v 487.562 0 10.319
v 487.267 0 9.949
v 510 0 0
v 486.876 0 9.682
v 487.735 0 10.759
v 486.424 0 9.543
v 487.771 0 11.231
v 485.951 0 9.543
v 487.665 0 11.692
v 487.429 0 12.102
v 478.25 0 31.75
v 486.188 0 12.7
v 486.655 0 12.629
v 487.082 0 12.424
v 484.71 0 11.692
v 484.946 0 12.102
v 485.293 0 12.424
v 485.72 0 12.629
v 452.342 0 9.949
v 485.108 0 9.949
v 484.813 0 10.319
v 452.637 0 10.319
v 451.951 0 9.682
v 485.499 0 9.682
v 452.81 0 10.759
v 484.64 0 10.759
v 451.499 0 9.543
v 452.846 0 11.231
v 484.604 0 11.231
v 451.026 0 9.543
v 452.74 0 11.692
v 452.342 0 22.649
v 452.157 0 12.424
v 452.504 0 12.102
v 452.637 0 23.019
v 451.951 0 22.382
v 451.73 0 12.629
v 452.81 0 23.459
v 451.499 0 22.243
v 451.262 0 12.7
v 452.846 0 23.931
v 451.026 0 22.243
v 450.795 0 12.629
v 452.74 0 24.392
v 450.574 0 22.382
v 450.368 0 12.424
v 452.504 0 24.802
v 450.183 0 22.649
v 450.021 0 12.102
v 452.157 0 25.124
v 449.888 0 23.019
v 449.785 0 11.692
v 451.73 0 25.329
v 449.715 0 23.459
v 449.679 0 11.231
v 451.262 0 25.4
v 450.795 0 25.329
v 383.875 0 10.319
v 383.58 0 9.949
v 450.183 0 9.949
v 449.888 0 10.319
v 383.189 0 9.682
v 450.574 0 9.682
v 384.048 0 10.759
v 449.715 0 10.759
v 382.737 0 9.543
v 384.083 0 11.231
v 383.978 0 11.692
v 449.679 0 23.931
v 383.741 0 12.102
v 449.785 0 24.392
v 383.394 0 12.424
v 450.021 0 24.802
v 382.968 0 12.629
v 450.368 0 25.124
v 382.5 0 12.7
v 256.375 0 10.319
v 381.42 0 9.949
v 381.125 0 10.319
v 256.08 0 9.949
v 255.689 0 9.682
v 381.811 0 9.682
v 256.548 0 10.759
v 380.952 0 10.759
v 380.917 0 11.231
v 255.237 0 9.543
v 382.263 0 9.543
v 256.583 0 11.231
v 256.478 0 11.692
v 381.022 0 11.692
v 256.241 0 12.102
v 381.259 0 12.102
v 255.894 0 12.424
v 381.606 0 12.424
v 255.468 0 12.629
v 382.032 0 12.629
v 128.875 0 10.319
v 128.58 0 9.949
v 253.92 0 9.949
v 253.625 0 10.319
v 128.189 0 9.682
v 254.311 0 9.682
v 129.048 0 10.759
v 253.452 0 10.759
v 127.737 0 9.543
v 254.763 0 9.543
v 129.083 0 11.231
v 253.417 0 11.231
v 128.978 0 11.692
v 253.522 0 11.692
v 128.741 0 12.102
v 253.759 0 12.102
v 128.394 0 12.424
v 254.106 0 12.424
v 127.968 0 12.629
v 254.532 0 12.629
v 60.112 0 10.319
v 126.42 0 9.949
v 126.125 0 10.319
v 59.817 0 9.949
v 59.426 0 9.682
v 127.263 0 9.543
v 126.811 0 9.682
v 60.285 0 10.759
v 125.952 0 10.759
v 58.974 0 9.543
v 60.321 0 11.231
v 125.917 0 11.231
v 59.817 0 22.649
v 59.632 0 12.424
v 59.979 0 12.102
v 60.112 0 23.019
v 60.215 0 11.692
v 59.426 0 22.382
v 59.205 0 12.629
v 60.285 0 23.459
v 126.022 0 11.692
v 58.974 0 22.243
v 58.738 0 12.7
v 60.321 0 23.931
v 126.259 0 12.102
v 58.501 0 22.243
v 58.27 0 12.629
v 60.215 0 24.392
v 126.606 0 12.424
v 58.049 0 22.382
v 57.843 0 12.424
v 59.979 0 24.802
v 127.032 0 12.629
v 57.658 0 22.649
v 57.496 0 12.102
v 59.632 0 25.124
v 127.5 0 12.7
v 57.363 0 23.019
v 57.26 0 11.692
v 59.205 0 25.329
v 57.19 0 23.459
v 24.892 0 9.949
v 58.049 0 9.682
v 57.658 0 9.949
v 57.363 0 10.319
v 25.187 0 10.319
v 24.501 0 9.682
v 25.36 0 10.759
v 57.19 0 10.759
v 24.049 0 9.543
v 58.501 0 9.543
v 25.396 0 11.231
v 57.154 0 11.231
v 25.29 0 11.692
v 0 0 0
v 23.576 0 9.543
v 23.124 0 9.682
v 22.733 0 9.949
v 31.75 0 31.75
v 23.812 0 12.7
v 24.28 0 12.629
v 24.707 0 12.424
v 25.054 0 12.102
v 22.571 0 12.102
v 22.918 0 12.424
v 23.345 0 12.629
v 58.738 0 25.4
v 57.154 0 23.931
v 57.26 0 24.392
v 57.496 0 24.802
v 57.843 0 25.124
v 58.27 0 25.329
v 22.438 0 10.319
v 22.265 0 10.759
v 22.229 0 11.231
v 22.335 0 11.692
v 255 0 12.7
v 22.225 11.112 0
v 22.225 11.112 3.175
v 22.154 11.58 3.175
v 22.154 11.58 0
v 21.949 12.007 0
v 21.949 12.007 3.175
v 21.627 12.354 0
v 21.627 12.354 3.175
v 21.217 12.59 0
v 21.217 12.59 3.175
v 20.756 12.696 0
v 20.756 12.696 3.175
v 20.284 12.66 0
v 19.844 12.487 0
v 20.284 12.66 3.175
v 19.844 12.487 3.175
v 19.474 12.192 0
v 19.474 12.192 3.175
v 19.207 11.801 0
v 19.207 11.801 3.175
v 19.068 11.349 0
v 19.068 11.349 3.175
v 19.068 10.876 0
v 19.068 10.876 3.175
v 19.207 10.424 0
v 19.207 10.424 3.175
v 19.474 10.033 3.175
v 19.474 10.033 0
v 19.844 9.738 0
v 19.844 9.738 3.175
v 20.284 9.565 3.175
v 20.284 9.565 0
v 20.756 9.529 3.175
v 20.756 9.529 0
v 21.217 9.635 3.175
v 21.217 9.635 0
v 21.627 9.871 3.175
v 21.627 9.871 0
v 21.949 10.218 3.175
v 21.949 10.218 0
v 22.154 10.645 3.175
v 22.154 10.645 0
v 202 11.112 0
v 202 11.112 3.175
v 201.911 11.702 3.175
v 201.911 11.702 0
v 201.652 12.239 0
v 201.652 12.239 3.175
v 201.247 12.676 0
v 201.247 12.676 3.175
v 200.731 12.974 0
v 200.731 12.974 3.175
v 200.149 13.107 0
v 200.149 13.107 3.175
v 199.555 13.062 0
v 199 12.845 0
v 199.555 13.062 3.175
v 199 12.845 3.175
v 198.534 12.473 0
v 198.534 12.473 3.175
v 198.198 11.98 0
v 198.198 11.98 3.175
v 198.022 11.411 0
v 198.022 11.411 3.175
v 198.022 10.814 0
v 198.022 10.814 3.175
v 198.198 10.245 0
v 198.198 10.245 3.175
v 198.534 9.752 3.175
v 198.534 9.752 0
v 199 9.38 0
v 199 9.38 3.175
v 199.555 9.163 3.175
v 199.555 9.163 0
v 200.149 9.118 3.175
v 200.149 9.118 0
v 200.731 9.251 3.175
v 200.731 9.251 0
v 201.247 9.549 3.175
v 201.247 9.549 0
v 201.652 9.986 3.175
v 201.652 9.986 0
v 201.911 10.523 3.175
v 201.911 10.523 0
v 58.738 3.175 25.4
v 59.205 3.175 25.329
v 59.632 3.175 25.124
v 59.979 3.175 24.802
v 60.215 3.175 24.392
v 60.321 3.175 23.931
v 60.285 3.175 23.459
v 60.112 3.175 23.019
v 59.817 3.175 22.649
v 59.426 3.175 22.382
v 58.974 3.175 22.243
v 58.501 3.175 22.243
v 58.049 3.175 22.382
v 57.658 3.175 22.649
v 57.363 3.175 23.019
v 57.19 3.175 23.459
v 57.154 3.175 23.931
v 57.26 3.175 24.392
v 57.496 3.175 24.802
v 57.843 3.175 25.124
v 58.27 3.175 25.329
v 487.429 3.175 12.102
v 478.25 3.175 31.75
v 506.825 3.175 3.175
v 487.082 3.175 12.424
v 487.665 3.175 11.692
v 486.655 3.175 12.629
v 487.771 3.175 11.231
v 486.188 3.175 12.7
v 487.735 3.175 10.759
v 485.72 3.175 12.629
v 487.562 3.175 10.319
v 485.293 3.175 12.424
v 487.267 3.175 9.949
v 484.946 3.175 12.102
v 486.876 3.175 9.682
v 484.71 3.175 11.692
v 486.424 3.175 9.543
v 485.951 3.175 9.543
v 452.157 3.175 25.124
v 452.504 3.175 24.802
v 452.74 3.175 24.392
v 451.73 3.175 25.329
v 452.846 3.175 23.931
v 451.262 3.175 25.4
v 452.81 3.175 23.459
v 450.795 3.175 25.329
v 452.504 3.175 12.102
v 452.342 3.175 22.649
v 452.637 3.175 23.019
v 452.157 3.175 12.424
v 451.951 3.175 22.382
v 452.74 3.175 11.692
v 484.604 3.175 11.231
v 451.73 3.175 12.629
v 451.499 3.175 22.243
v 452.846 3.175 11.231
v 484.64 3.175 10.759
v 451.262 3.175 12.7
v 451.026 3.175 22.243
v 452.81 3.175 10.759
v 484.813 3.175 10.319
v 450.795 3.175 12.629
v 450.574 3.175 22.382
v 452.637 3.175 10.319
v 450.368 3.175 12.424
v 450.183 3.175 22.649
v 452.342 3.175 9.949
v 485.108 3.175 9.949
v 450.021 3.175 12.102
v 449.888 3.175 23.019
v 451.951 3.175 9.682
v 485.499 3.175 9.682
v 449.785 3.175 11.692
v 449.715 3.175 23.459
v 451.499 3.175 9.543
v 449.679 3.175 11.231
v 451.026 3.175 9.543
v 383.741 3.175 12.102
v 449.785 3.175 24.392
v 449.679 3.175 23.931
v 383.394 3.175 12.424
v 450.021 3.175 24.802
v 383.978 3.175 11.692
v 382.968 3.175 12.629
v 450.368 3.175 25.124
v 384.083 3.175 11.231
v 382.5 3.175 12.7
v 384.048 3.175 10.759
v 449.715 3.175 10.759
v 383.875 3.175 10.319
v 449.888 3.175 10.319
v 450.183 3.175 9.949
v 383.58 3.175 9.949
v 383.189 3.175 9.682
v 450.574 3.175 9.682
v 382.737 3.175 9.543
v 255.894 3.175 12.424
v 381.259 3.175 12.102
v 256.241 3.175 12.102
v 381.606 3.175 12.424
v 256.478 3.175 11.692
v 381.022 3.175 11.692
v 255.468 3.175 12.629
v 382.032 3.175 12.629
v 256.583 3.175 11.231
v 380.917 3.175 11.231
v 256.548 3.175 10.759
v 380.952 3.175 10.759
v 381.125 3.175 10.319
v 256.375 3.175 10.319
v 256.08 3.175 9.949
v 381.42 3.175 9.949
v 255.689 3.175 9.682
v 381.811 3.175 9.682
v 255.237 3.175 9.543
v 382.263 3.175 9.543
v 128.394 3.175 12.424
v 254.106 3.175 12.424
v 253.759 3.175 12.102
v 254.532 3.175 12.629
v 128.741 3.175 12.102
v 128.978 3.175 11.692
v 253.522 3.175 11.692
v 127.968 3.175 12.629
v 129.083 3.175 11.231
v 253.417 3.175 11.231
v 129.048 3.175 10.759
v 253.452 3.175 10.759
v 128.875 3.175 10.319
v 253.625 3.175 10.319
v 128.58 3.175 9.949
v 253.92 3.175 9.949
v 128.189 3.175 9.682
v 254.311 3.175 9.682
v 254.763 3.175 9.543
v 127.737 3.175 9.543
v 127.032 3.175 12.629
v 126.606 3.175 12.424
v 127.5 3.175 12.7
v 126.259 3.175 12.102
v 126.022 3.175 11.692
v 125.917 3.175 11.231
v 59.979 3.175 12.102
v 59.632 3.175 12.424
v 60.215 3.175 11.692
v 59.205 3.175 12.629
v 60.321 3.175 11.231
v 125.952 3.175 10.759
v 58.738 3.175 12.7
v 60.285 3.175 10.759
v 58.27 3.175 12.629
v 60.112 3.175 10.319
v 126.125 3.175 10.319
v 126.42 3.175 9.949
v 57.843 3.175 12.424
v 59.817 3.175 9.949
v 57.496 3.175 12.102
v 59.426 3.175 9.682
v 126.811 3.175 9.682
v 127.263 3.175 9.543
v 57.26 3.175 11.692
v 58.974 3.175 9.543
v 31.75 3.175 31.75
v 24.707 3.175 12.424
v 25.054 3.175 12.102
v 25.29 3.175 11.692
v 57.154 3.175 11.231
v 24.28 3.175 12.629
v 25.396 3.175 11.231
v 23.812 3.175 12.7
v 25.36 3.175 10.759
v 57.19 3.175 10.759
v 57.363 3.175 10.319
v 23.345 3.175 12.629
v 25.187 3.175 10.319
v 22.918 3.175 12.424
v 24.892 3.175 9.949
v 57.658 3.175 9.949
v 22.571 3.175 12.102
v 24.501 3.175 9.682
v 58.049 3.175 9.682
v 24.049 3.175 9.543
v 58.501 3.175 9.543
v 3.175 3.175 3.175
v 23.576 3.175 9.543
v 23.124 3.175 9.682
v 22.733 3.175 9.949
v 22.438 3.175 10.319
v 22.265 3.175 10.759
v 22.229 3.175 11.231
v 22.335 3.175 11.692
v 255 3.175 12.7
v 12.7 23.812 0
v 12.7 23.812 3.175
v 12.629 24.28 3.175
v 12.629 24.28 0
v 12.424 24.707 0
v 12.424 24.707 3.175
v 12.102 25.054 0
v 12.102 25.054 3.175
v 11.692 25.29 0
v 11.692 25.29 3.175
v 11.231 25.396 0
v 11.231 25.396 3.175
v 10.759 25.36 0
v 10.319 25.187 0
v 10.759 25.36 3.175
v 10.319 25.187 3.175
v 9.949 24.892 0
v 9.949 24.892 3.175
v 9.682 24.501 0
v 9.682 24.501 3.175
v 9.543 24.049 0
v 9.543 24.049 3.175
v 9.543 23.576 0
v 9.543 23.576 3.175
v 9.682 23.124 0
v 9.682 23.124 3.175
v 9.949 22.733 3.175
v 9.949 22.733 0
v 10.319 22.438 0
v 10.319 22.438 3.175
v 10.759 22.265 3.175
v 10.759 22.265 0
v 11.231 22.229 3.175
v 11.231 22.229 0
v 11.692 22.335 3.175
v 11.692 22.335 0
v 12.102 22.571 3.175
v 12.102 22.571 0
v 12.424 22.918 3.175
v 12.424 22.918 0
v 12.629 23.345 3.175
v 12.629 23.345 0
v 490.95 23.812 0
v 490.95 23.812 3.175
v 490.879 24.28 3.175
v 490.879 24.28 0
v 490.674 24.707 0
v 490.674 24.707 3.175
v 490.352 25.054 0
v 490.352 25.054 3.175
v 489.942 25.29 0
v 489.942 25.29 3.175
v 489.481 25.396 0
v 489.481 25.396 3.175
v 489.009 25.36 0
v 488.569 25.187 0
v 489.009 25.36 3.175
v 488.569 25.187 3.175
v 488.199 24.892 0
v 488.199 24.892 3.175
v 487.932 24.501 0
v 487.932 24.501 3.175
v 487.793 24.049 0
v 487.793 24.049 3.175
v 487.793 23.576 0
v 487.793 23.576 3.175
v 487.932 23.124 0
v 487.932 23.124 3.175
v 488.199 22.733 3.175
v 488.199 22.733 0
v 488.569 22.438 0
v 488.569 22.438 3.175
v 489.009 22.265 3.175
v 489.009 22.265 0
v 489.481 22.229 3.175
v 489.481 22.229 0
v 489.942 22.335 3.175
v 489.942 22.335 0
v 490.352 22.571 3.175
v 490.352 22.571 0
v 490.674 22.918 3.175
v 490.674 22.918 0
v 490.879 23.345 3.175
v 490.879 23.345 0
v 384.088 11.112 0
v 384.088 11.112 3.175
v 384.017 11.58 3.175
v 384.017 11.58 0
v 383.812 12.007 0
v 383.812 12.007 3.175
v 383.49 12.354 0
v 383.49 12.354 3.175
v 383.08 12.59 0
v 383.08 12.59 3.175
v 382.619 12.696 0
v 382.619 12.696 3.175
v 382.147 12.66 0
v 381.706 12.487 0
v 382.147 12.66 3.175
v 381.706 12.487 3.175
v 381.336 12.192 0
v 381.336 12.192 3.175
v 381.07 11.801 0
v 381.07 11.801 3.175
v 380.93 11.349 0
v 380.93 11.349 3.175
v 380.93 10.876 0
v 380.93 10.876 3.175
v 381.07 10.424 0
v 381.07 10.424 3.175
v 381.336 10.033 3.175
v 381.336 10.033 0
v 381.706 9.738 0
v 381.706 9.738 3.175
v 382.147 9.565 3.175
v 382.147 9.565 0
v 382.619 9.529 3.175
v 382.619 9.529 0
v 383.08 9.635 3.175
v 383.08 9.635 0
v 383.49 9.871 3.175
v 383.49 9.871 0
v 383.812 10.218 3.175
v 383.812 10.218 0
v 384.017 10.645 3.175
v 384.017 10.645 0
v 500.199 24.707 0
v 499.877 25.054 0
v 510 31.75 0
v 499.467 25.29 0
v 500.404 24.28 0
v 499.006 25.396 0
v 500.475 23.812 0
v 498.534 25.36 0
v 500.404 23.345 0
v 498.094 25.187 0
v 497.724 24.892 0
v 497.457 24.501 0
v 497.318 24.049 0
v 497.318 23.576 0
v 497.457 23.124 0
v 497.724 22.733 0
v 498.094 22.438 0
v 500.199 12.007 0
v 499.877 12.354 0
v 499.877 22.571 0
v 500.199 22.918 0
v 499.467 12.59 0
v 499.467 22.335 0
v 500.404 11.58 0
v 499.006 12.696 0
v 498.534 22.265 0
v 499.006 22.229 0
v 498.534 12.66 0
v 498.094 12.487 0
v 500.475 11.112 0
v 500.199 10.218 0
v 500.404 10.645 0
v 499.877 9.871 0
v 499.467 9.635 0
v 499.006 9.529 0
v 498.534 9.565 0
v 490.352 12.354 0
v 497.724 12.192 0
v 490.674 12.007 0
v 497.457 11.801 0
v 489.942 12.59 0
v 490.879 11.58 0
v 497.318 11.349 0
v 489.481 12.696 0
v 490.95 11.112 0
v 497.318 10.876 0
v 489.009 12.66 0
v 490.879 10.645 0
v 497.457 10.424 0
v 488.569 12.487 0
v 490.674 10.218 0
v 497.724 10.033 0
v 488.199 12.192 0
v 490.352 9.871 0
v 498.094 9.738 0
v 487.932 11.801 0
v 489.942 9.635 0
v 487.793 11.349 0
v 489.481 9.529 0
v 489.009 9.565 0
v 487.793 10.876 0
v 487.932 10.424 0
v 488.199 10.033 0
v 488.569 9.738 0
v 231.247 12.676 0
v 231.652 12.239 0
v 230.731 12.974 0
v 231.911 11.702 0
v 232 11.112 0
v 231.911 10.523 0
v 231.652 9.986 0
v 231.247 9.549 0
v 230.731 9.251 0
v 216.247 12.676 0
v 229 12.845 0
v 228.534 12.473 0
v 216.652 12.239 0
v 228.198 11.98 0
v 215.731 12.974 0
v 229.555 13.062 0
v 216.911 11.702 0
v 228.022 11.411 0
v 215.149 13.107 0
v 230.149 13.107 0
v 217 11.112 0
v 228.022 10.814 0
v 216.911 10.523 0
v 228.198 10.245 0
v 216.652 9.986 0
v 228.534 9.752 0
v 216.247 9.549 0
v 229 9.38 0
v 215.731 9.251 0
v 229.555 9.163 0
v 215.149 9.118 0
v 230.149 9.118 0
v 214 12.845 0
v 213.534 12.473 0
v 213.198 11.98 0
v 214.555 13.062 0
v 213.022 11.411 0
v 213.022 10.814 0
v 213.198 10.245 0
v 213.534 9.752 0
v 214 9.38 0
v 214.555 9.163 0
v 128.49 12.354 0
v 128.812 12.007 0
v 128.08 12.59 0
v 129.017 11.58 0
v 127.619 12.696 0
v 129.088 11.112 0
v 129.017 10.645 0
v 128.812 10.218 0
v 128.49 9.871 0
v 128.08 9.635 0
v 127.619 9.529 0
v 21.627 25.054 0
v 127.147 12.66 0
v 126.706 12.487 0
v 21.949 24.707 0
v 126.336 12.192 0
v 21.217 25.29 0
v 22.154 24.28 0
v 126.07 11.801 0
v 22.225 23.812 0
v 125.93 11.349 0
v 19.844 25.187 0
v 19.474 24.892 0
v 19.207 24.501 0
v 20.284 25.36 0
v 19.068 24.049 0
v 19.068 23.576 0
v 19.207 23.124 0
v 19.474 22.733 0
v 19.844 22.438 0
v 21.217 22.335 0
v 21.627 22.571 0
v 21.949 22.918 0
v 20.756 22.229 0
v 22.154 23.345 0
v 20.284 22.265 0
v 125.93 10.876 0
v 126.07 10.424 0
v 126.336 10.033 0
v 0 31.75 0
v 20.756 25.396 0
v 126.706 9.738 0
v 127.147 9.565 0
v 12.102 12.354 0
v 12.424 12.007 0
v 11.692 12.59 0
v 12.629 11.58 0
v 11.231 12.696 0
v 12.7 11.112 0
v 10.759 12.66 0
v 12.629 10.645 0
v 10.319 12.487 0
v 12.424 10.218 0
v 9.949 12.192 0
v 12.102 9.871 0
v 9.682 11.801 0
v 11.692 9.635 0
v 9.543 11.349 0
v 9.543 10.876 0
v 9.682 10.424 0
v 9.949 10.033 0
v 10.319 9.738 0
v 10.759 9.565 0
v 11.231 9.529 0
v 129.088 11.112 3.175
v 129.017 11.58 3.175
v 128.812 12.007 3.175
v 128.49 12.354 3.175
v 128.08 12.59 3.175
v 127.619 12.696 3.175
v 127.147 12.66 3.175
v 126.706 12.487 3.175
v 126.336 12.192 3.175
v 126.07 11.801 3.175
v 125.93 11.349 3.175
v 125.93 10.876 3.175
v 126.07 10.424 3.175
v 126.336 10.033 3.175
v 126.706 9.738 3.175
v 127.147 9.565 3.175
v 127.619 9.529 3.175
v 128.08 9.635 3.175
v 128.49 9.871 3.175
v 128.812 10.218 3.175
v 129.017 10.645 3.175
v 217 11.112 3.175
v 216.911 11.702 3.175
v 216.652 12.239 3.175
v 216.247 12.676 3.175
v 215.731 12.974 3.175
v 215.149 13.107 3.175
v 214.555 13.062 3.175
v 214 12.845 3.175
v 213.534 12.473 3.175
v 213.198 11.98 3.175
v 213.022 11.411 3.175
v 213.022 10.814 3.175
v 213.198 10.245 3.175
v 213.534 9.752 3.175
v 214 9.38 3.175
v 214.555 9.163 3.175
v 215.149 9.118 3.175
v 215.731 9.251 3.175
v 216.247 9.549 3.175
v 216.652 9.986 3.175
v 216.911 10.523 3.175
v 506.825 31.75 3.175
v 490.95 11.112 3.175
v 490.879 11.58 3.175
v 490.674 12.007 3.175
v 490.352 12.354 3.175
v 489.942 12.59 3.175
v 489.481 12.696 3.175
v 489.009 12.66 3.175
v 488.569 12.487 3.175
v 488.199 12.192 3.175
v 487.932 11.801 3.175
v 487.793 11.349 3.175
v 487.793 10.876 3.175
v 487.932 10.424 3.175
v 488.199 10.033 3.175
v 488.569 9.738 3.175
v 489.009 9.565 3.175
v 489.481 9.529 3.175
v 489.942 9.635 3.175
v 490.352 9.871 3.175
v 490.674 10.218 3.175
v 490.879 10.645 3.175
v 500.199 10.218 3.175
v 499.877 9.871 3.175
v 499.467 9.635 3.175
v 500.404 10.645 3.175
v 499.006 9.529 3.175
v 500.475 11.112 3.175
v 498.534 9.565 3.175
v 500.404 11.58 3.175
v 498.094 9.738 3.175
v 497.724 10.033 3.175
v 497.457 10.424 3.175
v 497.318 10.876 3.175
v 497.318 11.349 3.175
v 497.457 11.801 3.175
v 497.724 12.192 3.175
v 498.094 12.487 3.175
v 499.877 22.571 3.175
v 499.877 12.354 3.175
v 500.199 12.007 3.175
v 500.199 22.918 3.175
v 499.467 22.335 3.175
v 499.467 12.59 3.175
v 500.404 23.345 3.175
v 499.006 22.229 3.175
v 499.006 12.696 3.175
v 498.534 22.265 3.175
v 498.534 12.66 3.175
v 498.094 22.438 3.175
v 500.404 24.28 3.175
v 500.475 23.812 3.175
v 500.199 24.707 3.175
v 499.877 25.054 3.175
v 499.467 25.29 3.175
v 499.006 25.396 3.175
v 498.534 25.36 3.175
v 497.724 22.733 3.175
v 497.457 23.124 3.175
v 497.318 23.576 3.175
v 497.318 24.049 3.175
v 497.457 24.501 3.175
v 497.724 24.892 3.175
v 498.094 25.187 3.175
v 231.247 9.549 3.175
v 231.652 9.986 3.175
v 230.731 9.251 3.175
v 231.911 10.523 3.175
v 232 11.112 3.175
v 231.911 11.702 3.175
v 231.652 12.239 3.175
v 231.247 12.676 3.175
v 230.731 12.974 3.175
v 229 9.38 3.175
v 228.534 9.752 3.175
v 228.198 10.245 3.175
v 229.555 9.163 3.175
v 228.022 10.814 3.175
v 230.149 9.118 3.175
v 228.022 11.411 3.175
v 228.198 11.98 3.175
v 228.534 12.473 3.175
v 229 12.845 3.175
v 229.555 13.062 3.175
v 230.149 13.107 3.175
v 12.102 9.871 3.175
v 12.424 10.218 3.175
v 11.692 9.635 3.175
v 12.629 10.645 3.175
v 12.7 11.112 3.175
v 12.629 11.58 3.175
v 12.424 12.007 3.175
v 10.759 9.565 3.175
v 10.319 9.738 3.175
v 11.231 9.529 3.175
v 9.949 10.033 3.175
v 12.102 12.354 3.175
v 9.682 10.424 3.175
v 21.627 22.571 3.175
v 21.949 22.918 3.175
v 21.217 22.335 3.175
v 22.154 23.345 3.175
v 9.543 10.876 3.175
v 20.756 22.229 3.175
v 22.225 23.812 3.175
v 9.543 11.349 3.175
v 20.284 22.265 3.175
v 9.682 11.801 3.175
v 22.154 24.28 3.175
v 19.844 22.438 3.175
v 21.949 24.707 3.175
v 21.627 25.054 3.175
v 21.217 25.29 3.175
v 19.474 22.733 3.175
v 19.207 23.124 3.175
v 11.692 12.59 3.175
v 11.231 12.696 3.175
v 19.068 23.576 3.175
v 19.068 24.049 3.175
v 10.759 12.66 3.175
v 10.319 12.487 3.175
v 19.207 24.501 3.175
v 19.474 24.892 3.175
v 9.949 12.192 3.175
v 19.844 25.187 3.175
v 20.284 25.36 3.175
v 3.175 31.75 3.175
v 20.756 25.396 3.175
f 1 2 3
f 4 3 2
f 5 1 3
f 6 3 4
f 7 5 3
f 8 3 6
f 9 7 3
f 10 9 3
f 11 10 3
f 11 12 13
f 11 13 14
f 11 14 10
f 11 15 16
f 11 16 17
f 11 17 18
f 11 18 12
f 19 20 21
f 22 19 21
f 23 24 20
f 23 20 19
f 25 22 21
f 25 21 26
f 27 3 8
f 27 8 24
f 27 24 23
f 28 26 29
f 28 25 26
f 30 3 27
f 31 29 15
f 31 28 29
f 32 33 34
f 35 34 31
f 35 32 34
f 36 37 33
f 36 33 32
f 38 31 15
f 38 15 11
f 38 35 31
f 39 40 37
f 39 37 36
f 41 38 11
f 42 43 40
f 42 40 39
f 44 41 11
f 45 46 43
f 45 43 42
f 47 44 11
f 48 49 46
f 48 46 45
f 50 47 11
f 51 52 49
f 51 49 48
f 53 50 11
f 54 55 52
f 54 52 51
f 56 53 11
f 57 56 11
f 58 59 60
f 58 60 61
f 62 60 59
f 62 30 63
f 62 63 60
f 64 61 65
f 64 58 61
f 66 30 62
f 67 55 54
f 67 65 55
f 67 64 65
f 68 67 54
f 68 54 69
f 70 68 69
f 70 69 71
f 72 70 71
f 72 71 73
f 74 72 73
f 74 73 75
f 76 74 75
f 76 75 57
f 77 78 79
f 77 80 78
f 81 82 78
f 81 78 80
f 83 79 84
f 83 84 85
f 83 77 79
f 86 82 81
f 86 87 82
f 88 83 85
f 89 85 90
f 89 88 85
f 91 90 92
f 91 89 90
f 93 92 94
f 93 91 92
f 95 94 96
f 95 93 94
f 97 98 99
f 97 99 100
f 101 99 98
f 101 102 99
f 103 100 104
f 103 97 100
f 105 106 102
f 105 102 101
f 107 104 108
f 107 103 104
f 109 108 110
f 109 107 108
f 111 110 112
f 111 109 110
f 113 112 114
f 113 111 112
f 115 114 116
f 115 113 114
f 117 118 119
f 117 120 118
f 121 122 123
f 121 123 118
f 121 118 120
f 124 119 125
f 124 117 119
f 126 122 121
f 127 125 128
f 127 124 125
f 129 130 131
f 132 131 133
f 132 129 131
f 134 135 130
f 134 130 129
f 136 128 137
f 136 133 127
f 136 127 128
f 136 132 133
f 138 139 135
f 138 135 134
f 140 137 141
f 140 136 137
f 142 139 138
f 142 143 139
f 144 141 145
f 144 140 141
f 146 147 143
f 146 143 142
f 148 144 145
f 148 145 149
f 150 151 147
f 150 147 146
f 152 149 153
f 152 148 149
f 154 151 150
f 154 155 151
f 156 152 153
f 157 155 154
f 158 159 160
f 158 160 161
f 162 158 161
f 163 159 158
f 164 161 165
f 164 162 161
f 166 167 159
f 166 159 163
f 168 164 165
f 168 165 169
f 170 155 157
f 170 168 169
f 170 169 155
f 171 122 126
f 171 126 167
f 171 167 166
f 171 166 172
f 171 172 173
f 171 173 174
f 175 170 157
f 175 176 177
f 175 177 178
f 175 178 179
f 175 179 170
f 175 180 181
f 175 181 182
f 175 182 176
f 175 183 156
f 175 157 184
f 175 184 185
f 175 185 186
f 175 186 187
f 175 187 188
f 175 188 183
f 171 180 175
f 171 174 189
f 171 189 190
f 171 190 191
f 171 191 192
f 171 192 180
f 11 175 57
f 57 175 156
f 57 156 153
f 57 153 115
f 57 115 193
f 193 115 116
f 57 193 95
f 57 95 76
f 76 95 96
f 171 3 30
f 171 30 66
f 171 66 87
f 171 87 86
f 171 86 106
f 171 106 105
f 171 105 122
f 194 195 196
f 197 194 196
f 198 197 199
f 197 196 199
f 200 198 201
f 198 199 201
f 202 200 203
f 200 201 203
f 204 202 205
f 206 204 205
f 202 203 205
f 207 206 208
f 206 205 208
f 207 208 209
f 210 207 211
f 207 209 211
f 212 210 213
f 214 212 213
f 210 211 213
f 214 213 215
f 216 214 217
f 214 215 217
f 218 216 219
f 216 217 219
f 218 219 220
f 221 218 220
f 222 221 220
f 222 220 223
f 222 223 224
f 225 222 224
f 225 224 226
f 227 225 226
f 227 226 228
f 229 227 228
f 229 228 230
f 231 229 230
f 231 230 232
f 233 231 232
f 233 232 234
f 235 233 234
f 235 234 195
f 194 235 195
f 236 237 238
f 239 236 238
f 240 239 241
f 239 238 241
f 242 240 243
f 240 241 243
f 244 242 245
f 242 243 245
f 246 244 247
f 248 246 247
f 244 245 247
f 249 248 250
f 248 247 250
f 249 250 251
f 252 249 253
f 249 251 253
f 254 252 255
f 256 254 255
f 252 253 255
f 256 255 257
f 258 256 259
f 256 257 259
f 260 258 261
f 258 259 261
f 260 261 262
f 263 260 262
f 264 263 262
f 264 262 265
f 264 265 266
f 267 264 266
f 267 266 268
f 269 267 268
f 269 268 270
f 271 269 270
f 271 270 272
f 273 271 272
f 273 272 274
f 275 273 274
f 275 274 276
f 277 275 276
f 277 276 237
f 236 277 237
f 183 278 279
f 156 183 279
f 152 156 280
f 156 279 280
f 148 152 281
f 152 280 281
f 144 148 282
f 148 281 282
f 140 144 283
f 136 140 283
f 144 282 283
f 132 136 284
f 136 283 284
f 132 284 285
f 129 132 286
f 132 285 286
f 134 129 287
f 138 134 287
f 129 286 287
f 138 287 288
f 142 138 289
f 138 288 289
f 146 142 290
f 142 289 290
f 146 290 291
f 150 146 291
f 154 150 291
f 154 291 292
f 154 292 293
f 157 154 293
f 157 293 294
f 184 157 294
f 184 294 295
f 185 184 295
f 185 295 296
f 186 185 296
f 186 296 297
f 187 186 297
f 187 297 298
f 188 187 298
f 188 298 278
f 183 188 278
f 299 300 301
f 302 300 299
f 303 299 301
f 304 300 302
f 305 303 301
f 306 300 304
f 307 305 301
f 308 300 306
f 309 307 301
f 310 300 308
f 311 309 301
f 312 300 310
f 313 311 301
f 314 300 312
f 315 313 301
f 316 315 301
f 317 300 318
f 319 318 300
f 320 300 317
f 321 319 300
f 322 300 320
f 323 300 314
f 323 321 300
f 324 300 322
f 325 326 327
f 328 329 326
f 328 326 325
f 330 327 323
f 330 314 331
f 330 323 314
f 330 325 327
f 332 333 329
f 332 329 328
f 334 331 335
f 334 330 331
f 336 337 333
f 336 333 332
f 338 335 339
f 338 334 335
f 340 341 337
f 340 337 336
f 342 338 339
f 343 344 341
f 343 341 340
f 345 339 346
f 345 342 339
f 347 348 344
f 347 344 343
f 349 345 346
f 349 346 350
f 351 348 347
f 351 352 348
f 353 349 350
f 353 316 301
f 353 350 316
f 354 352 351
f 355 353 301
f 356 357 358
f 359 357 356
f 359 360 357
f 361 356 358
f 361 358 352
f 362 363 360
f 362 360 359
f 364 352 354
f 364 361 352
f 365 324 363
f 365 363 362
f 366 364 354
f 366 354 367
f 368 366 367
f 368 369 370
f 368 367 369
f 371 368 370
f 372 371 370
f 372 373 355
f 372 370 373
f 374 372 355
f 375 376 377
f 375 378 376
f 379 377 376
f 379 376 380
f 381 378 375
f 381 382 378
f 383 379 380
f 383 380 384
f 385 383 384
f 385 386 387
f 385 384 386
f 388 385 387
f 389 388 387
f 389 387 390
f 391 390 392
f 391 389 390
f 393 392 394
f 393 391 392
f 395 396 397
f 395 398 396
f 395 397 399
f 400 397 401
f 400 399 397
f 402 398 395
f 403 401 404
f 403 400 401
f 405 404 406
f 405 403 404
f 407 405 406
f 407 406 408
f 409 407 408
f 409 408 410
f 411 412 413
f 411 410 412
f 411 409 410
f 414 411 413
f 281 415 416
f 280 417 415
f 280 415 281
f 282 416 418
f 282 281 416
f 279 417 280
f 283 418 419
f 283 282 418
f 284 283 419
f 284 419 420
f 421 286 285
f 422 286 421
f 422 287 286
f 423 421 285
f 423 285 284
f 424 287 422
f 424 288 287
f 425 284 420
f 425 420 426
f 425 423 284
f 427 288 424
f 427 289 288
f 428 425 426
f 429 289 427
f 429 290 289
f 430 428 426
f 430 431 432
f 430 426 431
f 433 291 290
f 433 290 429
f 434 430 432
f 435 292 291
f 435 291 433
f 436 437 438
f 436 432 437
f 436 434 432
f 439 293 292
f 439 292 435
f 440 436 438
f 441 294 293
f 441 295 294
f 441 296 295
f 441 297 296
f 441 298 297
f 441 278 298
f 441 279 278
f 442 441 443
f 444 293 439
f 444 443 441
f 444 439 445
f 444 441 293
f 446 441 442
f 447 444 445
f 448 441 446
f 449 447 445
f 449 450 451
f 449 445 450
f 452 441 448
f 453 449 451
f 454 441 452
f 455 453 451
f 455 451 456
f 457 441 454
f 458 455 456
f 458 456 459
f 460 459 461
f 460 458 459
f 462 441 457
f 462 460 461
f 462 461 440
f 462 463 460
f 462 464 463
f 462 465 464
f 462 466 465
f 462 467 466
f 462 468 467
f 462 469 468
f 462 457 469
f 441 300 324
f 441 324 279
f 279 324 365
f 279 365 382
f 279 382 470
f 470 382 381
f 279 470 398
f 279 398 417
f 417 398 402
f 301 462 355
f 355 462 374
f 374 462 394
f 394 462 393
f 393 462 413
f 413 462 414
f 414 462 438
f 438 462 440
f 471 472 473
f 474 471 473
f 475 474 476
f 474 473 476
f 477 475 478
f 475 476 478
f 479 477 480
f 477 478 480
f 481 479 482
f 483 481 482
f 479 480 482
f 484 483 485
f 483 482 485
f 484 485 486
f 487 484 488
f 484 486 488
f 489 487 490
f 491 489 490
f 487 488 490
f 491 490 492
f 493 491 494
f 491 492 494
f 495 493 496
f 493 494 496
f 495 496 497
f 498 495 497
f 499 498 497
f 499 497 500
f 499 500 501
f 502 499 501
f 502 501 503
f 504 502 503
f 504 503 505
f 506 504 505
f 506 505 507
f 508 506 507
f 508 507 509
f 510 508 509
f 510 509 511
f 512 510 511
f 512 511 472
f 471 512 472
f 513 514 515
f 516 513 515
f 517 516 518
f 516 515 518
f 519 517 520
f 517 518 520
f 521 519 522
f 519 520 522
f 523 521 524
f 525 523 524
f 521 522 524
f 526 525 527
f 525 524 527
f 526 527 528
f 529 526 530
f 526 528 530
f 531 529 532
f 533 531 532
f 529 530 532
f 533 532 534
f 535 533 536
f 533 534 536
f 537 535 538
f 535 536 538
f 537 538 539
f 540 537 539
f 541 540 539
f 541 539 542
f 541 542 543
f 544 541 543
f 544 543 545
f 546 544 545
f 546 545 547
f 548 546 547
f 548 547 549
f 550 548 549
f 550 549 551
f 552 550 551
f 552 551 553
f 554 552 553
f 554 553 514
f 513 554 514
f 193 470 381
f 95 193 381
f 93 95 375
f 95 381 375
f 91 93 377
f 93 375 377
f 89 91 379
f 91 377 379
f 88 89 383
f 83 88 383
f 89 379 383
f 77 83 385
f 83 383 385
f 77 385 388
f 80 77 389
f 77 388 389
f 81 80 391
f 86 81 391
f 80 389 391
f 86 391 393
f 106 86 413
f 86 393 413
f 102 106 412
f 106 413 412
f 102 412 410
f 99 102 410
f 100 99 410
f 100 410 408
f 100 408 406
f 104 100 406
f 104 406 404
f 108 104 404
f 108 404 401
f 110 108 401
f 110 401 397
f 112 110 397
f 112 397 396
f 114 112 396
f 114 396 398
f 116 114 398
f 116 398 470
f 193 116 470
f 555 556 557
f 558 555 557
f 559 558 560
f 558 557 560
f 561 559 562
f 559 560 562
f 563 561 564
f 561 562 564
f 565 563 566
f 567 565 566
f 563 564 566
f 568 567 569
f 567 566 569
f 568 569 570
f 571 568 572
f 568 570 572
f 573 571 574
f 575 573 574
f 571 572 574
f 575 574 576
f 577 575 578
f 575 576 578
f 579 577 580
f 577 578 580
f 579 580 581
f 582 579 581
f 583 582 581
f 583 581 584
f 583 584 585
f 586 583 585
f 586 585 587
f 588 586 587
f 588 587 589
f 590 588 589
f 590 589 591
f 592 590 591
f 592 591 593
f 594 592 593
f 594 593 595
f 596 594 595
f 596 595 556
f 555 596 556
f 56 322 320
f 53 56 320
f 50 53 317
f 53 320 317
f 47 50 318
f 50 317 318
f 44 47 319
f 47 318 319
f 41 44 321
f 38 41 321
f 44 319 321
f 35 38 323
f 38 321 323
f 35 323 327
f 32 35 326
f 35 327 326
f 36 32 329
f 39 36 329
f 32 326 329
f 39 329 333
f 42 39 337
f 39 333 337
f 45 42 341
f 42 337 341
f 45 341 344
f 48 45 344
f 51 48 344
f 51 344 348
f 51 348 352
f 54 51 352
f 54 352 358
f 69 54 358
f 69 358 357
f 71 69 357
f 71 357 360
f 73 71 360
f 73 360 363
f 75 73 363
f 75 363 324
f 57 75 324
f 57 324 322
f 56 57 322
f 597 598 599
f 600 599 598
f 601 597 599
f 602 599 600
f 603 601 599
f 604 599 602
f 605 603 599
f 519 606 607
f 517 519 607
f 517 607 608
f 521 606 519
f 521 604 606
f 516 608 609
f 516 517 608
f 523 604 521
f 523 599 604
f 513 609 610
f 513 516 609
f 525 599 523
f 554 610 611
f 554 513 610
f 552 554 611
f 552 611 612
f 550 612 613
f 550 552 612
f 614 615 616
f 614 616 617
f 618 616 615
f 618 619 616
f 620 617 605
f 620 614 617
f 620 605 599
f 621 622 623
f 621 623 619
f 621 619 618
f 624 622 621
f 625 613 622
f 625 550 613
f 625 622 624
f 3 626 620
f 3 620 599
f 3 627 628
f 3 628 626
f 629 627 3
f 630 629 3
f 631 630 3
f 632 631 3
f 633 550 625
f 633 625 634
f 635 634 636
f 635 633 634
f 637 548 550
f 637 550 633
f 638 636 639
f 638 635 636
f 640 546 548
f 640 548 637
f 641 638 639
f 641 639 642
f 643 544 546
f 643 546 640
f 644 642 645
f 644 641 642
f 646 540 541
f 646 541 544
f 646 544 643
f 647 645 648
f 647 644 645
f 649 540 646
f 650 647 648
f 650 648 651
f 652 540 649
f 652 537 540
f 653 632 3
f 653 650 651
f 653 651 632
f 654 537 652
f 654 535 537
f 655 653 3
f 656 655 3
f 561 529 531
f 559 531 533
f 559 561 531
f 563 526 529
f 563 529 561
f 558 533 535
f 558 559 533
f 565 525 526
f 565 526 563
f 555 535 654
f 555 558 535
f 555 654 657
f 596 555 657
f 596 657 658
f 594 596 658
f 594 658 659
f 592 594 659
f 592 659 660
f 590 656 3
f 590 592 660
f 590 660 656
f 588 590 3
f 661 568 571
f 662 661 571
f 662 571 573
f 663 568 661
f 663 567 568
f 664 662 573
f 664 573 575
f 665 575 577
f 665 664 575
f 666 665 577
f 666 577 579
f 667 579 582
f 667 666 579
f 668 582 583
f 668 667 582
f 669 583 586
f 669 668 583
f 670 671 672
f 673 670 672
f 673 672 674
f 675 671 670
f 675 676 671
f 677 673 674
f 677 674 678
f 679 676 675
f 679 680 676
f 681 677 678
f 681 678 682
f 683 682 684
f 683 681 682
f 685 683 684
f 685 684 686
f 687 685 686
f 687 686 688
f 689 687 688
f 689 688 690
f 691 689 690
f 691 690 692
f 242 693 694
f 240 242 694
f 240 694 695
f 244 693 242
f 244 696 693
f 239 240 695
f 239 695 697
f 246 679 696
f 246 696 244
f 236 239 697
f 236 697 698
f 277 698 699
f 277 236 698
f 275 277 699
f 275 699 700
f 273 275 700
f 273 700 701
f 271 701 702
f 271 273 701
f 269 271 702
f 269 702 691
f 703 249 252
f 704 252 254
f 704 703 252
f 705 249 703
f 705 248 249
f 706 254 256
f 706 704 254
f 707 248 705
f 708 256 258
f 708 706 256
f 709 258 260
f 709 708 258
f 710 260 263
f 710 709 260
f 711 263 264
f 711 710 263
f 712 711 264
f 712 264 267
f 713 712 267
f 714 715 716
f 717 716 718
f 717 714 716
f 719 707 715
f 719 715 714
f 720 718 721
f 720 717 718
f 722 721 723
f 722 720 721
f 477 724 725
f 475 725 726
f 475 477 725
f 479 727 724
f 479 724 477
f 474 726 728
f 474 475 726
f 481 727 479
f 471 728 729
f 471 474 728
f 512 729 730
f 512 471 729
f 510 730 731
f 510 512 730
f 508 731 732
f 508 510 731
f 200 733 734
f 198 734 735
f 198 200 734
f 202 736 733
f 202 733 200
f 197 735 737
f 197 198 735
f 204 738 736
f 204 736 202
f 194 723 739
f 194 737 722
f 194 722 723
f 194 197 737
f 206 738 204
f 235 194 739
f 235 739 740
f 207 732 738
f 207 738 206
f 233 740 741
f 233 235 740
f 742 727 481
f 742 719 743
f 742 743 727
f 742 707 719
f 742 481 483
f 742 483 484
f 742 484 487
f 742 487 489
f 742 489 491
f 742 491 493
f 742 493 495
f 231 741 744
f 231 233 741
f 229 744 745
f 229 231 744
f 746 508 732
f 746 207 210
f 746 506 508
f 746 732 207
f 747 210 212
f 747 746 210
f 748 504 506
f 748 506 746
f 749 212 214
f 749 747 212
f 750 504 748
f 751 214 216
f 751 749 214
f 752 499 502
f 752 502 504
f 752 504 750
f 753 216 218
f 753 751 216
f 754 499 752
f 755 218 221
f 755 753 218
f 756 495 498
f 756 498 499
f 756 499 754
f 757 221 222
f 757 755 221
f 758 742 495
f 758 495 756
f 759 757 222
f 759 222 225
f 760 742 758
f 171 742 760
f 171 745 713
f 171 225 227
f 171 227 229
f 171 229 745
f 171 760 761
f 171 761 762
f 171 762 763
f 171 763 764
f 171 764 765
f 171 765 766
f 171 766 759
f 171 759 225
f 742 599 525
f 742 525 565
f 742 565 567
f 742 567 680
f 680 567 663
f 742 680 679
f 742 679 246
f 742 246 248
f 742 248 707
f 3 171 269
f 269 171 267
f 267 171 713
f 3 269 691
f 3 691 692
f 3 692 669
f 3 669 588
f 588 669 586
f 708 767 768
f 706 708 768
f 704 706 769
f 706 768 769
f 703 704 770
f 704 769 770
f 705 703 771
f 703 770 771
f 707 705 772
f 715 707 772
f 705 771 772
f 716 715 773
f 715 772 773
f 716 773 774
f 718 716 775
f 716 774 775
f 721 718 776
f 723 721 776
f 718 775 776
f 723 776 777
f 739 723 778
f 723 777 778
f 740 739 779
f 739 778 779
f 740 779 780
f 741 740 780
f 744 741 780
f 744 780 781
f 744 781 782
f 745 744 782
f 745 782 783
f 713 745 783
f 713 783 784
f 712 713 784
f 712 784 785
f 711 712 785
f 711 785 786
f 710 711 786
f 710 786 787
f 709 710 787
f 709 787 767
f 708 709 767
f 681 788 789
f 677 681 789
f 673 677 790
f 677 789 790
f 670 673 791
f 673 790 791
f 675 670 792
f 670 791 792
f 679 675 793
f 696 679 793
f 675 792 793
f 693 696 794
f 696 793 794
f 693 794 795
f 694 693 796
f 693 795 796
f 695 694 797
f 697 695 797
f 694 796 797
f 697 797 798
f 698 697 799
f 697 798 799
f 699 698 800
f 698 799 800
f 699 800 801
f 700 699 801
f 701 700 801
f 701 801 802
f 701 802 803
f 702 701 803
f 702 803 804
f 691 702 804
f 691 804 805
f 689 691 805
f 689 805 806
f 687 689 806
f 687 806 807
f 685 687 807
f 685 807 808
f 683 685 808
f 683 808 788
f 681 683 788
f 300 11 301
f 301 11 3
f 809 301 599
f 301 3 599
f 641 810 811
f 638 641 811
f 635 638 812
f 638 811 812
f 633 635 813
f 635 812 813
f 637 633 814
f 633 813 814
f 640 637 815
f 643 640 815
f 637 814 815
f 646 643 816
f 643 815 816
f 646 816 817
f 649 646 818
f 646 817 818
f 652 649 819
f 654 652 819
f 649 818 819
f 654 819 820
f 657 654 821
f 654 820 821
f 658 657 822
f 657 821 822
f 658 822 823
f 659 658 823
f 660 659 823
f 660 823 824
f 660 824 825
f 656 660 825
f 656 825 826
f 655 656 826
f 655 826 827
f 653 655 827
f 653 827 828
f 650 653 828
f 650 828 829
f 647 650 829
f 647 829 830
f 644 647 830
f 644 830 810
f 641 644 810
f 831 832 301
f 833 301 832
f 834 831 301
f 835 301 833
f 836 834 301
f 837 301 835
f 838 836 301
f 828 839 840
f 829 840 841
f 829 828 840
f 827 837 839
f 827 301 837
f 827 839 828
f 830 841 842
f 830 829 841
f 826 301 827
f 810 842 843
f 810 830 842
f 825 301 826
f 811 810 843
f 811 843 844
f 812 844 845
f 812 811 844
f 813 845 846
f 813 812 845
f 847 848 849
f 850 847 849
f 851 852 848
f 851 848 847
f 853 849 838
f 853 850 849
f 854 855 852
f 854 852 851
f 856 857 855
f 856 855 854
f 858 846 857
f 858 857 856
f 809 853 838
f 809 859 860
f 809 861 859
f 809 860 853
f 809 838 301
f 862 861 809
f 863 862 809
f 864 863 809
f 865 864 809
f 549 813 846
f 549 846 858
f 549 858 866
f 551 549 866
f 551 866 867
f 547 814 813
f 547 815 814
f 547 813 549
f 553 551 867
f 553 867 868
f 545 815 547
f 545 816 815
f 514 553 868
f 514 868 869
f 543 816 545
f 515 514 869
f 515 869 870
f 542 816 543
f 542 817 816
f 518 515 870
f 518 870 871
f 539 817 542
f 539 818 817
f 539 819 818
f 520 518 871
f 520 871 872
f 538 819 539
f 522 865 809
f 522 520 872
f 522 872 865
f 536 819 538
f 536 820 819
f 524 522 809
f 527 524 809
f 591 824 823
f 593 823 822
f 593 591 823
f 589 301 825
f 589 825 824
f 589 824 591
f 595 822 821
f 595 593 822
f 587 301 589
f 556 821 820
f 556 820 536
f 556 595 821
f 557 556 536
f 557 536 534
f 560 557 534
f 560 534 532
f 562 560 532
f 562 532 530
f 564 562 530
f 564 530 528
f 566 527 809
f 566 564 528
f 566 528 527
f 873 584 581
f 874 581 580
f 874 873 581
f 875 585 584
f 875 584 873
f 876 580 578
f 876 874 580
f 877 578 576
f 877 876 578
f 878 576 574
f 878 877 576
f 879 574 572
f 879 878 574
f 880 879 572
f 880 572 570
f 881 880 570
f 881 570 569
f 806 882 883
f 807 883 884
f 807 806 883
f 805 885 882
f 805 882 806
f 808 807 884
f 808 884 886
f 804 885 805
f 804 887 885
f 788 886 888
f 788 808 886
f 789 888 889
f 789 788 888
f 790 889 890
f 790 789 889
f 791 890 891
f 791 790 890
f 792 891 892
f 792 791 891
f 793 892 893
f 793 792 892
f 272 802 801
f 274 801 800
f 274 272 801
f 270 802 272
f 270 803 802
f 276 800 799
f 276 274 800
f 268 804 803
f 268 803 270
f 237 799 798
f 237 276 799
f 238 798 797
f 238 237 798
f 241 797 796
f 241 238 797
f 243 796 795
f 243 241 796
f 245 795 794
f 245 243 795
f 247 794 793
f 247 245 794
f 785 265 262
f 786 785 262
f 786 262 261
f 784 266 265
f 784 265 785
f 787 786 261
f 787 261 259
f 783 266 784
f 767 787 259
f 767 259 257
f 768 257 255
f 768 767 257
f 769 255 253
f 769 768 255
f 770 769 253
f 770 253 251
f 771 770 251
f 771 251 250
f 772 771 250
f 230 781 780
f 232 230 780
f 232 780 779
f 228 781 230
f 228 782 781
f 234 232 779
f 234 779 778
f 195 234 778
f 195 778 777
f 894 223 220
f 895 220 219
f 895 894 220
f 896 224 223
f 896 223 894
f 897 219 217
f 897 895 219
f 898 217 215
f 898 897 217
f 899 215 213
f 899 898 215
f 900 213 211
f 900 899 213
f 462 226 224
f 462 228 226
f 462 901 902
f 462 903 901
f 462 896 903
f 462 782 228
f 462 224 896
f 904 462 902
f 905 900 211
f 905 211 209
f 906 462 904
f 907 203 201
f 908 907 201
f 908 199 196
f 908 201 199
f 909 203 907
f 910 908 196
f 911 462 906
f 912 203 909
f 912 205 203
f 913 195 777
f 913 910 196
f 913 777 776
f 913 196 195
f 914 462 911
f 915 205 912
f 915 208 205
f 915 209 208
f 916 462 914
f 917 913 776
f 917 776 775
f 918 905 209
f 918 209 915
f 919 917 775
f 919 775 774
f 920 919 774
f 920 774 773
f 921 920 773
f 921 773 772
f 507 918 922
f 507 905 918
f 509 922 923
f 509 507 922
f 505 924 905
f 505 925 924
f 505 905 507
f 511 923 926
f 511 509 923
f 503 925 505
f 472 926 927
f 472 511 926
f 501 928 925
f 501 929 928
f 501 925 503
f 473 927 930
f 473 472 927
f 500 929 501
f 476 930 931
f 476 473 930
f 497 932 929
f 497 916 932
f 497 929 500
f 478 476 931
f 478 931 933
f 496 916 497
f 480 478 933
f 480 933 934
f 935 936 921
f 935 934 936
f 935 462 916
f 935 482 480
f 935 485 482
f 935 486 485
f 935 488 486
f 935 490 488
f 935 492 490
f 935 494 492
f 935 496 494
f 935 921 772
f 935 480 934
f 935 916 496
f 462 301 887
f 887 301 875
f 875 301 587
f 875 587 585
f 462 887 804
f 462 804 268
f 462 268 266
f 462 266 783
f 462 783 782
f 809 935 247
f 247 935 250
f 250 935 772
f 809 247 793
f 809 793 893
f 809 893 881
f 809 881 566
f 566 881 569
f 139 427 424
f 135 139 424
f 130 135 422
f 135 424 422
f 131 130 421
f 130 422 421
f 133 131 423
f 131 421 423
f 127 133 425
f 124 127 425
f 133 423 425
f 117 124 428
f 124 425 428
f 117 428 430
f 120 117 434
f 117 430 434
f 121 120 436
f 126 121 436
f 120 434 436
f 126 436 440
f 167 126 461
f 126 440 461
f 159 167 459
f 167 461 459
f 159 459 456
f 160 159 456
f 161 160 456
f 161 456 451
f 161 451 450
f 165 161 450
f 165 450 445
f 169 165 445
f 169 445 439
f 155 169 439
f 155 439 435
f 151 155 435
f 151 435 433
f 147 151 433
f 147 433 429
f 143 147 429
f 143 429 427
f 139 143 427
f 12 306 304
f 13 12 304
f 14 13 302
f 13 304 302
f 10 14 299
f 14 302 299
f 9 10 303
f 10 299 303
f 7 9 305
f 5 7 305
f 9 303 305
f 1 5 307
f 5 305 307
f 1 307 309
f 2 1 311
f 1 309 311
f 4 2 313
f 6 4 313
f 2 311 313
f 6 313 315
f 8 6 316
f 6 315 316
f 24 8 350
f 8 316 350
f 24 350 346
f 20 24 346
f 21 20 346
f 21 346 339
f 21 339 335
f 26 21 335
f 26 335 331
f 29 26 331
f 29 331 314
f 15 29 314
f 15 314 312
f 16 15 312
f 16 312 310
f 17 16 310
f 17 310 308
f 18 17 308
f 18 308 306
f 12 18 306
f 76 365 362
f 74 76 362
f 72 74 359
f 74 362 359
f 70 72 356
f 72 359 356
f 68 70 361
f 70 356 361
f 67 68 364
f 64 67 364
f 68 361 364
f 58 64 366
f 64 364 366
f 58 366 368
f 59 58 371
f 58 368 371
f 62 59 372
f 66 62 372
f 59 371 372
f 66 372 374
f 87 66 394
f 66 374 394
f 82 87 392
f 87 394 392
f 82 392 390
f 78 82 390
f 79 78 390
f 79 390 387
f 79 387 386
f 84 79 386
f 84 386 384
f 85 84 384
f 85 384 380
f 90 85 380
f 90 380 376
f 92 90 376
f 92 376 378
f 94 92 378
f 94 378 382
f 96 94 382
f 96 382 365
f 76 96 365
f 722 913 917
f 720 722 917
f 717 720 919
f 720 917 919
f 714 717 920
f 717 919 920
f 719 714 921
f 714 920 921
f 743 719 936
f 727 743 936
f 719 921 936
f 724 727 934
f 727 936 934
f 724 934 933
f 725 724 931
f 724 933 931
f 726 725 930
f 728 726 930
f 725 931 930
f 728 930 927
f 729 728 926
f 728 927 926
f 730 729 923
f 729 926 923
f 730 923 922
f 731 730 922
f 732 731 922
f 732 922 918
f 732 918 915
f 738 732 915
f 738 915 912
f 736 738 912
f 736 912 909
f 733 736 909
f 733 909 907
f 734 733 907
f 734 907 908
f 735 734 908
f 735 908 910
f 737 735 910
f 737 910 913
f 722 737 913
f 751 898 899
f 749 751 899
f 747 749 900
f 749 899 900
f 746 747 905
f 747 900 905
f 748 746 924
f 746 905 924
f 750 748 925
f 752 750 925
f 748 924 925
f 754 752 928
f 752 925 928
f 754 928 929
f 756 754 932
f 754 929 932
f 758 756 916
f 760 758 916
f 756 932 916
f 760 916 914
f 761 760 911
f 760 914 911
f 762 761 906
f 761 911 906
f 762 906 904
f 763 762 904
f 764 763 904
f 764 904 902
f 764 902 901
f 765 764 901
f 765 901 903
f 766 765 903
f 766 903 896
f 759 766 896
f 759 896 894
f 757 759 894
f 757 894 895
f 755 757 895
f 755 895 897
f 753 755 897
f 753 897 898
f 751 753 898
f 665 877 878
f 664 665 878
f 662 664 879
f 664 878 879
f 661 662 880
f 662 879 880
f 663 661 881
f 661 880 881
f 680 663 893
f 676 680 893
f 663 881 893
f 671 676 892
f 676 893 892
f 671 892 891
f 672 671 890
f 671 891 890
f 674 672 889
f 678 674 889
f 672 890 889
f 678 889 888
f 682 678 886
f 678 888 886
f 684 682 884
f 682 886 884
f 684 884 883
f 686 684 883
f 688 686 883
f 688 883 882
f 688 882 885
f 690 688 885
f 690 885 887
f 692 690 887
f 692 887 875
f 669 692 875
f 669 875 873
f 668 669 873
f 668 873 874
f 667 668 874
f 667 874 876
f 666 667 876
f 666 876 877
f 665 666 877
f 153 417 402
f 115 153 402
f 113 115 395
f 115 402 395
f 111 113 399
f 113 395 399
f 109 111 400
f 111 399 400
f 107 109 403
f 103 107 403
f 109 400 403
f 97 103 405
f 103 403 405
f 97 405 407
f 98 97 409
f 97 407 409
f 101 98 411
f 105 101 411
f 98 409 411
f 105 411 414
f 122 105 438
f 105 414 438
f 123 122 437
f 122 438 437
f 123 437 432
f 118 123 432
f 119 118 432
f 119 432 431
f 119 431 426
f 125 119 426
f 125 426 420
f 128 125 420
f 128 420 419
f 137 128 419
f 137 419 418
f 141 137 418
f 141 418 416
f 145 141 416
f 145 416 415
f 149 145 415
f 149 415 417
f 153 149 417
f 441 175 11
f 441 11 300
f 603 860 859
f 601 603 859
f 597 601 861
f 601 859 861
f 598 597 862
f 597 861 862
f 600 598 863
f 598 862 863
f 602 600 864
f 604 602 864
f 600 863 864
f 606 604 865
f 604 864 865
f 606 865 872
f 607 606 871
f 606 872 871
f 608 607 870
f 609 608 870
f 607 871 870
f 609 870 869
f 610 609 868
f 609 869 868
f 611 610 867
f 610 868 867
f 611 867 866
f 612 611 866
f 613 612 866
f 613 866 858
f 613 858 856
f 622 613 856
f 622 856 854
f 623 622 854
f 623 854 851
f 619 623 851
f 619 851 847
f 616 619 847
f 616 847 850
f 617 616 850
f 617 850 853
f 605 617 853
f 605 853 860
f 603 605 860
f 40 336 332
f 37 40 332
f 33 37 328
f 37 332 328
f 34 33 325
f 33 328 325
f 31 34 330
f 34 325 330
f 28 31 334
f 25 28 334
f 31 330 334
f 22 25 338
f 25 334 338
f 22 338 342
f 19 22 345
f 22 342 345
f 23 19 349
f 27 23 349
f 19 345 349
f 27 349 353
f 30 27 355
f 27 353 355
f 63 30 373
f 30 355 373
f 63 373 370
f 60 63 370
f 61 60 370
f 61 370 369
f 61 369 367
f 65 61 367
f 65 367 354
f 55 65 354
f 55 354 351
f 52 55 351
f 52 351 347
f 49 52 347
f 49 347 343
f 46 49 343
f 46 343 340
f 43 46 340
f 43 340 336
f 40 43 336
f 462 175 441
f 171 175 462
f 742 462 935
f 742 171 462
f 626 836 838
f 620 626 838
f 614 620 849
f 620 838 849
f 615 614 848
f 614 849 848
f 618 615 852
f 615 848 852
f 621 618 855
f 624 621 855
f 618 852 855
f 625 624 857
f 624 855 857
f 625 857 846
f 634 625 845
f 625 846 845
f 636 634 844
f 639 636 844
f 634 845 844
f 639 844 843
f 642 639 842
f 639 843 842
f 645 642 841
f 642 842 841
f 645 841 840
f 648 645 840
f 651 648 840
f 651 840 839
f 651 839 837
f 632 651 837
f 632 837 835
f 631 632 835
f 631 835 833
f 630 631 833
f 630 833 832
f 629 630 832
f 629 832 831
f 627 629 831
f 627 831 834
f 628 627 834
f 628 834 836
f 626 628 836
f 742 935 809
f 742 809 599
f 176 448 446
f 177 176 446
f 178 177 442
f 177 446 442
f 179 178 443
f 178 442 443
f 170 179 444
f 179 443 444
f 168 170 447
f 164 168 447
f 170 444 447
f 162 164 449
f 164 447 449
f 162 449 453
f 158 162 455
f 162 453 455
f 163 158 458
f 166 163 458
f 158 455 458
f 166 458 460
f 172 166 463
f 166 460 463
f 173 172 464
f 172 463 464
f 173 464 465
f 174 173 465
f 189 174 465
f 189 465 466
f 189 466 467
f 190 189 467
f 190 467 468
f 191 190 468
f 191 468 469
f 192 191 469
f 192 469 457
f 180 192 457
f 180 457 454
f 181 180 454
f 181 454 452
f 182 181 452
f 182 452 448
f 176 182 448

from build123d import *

# Parameters (mm, degrees)
BOSS_EXTRUDE1_DEPTH          = 510
CHAMFER6_SIZE                = 31.75
CHAMFER7_SIZE                = 31.75
TOPHOLES_SKETCH3_R           = 1.5875
TOPHOLES_CUT_EXTRUDE2_DEPTH  = 512.785690622
SIDEHOLES_SKETCH4_R          = 1.5875
SIDEHOLES_SKETCH4_R_2        = 2
SIDEHOLES_CUT_EXTRUDE3_DEPTH = 512.785690622


with BuildPart() as part:
    # Sketch1 → Boss-Extrude1 (new body)
    with BuildSketch(Plane(origin=(0, 0, 0), x_dir=(0, 0, -1), z_dir=(1, 0, 0))):
        Polygon((0, 0), (-31.75, 0), (-31.75, 3.175), (-3.175, 3.175), (-3.175, 31.75), (0, 31.75), align=None)
    extrude(amount=BOSS_EXTRUDE1_DEPTH)

    # Chamfer6
    chamfer6_edges = [part.edges().sort_by_distance(p)[0] for p in [
        (510, 1.5875, 31.75),
    ]]
    chamfer(chamfer6_edges, length=CHAMFER6_SIZE - 0.0001)  # a hair under: the kernel refuses the full size

    # Chamfer7
    chamfer7_edges = [part.edges().sort_by_distance(p)[0] for p in [
        (0, 1.5875, 31.75),
    ]]
    chamfer(chamfer7_edges, length=CHAMFER7_SIZE - 0.0001)  # a hair under: the kernel refuses the full size

    # TopHoles-Sketch3 → TopHoles-Cut-Extrude2 (cut, through all)
    with BuildSketch(Plane(origin=(0, 3.175, 0), x_dir=(1, 0, 0), z_dir=(0, 1, 0))):
        with Locations(Location((58.7375, -23.8125, 0), (0, 0, 270))):
            Circle(TOPHOLES_SKETCH3_R)
        with Locations(Location((451.2625, -23.8125, 0), (0, 0, 270))):
            Circle(TOPHOLES_SKETCH3_R)
        with Locations(Location((451.2625, -11.1125, 0), (0, 0, 270))):
            Circle(TOPHOLES_SKETCH3_R)
        with Locations(Location((58.7375, -11.1125, 0), (0, 0, 270))):
            Circle(TOPHOLES_SKETCH3_R)
        with Locations(Location((486.1875, -11.1125, 0), (0, 0, 270))):
            Circle(TOPHOLES_SKETCH3_R)
        with Locations(Location((23.8125, -11.1125, 0), (0, 0, 270))):
            Circle(TOPHOLES_SKETCH3_R)
        with Locations(Location((127.5, -11.1125, 0), (0, 0, 270))):
            Circle(TOPHOLES_SKETCH3_R)
        with Locations(Location((255, -11.1125, 0), (0, 0, 270))):
            Circle(TOPHOLES_SKETCH3_R)
        with Locations(Location((382.5, -11.1125, 0), (0, 0, 270))):
            Circle(TOPHOLES_SKETCH3_R)
    extrude(amount=-TOPHOLES_CUT_EXTRUDE2_DEPTH, mode=Mode.SUBTRACT)

    # SideHoles-Sketch4 → SideHoles-Cut-Extrude3 (cut, through all)
    with BuildSketch(Plane.XY.offset(3.175)):
        with Locations((11.1125, 23.8125)):
            Circle(SIDEHOLES_SKETCH4_R)
        with Locations((489.3625, 23.8125)):
            Circle(SIDEHOLES_SKETCH4_R)
        with Locations((20.6375, 23.8125)):
            Circle(SIDEHOLES_SKETCH4_R)
        with Locations((498.8875, 23.8125)):
            Circle(SIDEHOLES_SKETCH4_R)
        with Locations((11.1125, 11.1125)):
            Circle(SIDEHOLES_SKETCH4_R)
        with Locations((20.6375, 11.1125)):
            Circle(SIDEHOLES_SKETCH4_R)
        with Locations((489.3625, 11.1125)):
            Circle(SIDEHOLES_SKETCH4_R)
        with Locations((498.8875, 11.1125)):
            Circle(SIDEHOLES_SKETCH4_R)
        with Locations((200, 11.1125)):
            Circle(SIDEHOLES_SKETCH4_R_2)
        with Locations((215, 11.1125)):
            Circle(SIDEHOLES_SKETCH4_R_2)
        with Locations((230, 11.1125)):
            Circle(SIDEHOLES_SKETCH4_R_2)
        with Locations((127.5, 11.1125)):
            Circle(SIDEHOLES_SKETCH4_R)
        with Locations((382.5, 11.1125)):
            Circle(SIDEHOLES_SKETCH4_R)
    extrude(amount=-SIDEHOLES_CUT_EXTRUDE3_DEPTH, mode=Mode.SUBTRACT)


solid = part.part
